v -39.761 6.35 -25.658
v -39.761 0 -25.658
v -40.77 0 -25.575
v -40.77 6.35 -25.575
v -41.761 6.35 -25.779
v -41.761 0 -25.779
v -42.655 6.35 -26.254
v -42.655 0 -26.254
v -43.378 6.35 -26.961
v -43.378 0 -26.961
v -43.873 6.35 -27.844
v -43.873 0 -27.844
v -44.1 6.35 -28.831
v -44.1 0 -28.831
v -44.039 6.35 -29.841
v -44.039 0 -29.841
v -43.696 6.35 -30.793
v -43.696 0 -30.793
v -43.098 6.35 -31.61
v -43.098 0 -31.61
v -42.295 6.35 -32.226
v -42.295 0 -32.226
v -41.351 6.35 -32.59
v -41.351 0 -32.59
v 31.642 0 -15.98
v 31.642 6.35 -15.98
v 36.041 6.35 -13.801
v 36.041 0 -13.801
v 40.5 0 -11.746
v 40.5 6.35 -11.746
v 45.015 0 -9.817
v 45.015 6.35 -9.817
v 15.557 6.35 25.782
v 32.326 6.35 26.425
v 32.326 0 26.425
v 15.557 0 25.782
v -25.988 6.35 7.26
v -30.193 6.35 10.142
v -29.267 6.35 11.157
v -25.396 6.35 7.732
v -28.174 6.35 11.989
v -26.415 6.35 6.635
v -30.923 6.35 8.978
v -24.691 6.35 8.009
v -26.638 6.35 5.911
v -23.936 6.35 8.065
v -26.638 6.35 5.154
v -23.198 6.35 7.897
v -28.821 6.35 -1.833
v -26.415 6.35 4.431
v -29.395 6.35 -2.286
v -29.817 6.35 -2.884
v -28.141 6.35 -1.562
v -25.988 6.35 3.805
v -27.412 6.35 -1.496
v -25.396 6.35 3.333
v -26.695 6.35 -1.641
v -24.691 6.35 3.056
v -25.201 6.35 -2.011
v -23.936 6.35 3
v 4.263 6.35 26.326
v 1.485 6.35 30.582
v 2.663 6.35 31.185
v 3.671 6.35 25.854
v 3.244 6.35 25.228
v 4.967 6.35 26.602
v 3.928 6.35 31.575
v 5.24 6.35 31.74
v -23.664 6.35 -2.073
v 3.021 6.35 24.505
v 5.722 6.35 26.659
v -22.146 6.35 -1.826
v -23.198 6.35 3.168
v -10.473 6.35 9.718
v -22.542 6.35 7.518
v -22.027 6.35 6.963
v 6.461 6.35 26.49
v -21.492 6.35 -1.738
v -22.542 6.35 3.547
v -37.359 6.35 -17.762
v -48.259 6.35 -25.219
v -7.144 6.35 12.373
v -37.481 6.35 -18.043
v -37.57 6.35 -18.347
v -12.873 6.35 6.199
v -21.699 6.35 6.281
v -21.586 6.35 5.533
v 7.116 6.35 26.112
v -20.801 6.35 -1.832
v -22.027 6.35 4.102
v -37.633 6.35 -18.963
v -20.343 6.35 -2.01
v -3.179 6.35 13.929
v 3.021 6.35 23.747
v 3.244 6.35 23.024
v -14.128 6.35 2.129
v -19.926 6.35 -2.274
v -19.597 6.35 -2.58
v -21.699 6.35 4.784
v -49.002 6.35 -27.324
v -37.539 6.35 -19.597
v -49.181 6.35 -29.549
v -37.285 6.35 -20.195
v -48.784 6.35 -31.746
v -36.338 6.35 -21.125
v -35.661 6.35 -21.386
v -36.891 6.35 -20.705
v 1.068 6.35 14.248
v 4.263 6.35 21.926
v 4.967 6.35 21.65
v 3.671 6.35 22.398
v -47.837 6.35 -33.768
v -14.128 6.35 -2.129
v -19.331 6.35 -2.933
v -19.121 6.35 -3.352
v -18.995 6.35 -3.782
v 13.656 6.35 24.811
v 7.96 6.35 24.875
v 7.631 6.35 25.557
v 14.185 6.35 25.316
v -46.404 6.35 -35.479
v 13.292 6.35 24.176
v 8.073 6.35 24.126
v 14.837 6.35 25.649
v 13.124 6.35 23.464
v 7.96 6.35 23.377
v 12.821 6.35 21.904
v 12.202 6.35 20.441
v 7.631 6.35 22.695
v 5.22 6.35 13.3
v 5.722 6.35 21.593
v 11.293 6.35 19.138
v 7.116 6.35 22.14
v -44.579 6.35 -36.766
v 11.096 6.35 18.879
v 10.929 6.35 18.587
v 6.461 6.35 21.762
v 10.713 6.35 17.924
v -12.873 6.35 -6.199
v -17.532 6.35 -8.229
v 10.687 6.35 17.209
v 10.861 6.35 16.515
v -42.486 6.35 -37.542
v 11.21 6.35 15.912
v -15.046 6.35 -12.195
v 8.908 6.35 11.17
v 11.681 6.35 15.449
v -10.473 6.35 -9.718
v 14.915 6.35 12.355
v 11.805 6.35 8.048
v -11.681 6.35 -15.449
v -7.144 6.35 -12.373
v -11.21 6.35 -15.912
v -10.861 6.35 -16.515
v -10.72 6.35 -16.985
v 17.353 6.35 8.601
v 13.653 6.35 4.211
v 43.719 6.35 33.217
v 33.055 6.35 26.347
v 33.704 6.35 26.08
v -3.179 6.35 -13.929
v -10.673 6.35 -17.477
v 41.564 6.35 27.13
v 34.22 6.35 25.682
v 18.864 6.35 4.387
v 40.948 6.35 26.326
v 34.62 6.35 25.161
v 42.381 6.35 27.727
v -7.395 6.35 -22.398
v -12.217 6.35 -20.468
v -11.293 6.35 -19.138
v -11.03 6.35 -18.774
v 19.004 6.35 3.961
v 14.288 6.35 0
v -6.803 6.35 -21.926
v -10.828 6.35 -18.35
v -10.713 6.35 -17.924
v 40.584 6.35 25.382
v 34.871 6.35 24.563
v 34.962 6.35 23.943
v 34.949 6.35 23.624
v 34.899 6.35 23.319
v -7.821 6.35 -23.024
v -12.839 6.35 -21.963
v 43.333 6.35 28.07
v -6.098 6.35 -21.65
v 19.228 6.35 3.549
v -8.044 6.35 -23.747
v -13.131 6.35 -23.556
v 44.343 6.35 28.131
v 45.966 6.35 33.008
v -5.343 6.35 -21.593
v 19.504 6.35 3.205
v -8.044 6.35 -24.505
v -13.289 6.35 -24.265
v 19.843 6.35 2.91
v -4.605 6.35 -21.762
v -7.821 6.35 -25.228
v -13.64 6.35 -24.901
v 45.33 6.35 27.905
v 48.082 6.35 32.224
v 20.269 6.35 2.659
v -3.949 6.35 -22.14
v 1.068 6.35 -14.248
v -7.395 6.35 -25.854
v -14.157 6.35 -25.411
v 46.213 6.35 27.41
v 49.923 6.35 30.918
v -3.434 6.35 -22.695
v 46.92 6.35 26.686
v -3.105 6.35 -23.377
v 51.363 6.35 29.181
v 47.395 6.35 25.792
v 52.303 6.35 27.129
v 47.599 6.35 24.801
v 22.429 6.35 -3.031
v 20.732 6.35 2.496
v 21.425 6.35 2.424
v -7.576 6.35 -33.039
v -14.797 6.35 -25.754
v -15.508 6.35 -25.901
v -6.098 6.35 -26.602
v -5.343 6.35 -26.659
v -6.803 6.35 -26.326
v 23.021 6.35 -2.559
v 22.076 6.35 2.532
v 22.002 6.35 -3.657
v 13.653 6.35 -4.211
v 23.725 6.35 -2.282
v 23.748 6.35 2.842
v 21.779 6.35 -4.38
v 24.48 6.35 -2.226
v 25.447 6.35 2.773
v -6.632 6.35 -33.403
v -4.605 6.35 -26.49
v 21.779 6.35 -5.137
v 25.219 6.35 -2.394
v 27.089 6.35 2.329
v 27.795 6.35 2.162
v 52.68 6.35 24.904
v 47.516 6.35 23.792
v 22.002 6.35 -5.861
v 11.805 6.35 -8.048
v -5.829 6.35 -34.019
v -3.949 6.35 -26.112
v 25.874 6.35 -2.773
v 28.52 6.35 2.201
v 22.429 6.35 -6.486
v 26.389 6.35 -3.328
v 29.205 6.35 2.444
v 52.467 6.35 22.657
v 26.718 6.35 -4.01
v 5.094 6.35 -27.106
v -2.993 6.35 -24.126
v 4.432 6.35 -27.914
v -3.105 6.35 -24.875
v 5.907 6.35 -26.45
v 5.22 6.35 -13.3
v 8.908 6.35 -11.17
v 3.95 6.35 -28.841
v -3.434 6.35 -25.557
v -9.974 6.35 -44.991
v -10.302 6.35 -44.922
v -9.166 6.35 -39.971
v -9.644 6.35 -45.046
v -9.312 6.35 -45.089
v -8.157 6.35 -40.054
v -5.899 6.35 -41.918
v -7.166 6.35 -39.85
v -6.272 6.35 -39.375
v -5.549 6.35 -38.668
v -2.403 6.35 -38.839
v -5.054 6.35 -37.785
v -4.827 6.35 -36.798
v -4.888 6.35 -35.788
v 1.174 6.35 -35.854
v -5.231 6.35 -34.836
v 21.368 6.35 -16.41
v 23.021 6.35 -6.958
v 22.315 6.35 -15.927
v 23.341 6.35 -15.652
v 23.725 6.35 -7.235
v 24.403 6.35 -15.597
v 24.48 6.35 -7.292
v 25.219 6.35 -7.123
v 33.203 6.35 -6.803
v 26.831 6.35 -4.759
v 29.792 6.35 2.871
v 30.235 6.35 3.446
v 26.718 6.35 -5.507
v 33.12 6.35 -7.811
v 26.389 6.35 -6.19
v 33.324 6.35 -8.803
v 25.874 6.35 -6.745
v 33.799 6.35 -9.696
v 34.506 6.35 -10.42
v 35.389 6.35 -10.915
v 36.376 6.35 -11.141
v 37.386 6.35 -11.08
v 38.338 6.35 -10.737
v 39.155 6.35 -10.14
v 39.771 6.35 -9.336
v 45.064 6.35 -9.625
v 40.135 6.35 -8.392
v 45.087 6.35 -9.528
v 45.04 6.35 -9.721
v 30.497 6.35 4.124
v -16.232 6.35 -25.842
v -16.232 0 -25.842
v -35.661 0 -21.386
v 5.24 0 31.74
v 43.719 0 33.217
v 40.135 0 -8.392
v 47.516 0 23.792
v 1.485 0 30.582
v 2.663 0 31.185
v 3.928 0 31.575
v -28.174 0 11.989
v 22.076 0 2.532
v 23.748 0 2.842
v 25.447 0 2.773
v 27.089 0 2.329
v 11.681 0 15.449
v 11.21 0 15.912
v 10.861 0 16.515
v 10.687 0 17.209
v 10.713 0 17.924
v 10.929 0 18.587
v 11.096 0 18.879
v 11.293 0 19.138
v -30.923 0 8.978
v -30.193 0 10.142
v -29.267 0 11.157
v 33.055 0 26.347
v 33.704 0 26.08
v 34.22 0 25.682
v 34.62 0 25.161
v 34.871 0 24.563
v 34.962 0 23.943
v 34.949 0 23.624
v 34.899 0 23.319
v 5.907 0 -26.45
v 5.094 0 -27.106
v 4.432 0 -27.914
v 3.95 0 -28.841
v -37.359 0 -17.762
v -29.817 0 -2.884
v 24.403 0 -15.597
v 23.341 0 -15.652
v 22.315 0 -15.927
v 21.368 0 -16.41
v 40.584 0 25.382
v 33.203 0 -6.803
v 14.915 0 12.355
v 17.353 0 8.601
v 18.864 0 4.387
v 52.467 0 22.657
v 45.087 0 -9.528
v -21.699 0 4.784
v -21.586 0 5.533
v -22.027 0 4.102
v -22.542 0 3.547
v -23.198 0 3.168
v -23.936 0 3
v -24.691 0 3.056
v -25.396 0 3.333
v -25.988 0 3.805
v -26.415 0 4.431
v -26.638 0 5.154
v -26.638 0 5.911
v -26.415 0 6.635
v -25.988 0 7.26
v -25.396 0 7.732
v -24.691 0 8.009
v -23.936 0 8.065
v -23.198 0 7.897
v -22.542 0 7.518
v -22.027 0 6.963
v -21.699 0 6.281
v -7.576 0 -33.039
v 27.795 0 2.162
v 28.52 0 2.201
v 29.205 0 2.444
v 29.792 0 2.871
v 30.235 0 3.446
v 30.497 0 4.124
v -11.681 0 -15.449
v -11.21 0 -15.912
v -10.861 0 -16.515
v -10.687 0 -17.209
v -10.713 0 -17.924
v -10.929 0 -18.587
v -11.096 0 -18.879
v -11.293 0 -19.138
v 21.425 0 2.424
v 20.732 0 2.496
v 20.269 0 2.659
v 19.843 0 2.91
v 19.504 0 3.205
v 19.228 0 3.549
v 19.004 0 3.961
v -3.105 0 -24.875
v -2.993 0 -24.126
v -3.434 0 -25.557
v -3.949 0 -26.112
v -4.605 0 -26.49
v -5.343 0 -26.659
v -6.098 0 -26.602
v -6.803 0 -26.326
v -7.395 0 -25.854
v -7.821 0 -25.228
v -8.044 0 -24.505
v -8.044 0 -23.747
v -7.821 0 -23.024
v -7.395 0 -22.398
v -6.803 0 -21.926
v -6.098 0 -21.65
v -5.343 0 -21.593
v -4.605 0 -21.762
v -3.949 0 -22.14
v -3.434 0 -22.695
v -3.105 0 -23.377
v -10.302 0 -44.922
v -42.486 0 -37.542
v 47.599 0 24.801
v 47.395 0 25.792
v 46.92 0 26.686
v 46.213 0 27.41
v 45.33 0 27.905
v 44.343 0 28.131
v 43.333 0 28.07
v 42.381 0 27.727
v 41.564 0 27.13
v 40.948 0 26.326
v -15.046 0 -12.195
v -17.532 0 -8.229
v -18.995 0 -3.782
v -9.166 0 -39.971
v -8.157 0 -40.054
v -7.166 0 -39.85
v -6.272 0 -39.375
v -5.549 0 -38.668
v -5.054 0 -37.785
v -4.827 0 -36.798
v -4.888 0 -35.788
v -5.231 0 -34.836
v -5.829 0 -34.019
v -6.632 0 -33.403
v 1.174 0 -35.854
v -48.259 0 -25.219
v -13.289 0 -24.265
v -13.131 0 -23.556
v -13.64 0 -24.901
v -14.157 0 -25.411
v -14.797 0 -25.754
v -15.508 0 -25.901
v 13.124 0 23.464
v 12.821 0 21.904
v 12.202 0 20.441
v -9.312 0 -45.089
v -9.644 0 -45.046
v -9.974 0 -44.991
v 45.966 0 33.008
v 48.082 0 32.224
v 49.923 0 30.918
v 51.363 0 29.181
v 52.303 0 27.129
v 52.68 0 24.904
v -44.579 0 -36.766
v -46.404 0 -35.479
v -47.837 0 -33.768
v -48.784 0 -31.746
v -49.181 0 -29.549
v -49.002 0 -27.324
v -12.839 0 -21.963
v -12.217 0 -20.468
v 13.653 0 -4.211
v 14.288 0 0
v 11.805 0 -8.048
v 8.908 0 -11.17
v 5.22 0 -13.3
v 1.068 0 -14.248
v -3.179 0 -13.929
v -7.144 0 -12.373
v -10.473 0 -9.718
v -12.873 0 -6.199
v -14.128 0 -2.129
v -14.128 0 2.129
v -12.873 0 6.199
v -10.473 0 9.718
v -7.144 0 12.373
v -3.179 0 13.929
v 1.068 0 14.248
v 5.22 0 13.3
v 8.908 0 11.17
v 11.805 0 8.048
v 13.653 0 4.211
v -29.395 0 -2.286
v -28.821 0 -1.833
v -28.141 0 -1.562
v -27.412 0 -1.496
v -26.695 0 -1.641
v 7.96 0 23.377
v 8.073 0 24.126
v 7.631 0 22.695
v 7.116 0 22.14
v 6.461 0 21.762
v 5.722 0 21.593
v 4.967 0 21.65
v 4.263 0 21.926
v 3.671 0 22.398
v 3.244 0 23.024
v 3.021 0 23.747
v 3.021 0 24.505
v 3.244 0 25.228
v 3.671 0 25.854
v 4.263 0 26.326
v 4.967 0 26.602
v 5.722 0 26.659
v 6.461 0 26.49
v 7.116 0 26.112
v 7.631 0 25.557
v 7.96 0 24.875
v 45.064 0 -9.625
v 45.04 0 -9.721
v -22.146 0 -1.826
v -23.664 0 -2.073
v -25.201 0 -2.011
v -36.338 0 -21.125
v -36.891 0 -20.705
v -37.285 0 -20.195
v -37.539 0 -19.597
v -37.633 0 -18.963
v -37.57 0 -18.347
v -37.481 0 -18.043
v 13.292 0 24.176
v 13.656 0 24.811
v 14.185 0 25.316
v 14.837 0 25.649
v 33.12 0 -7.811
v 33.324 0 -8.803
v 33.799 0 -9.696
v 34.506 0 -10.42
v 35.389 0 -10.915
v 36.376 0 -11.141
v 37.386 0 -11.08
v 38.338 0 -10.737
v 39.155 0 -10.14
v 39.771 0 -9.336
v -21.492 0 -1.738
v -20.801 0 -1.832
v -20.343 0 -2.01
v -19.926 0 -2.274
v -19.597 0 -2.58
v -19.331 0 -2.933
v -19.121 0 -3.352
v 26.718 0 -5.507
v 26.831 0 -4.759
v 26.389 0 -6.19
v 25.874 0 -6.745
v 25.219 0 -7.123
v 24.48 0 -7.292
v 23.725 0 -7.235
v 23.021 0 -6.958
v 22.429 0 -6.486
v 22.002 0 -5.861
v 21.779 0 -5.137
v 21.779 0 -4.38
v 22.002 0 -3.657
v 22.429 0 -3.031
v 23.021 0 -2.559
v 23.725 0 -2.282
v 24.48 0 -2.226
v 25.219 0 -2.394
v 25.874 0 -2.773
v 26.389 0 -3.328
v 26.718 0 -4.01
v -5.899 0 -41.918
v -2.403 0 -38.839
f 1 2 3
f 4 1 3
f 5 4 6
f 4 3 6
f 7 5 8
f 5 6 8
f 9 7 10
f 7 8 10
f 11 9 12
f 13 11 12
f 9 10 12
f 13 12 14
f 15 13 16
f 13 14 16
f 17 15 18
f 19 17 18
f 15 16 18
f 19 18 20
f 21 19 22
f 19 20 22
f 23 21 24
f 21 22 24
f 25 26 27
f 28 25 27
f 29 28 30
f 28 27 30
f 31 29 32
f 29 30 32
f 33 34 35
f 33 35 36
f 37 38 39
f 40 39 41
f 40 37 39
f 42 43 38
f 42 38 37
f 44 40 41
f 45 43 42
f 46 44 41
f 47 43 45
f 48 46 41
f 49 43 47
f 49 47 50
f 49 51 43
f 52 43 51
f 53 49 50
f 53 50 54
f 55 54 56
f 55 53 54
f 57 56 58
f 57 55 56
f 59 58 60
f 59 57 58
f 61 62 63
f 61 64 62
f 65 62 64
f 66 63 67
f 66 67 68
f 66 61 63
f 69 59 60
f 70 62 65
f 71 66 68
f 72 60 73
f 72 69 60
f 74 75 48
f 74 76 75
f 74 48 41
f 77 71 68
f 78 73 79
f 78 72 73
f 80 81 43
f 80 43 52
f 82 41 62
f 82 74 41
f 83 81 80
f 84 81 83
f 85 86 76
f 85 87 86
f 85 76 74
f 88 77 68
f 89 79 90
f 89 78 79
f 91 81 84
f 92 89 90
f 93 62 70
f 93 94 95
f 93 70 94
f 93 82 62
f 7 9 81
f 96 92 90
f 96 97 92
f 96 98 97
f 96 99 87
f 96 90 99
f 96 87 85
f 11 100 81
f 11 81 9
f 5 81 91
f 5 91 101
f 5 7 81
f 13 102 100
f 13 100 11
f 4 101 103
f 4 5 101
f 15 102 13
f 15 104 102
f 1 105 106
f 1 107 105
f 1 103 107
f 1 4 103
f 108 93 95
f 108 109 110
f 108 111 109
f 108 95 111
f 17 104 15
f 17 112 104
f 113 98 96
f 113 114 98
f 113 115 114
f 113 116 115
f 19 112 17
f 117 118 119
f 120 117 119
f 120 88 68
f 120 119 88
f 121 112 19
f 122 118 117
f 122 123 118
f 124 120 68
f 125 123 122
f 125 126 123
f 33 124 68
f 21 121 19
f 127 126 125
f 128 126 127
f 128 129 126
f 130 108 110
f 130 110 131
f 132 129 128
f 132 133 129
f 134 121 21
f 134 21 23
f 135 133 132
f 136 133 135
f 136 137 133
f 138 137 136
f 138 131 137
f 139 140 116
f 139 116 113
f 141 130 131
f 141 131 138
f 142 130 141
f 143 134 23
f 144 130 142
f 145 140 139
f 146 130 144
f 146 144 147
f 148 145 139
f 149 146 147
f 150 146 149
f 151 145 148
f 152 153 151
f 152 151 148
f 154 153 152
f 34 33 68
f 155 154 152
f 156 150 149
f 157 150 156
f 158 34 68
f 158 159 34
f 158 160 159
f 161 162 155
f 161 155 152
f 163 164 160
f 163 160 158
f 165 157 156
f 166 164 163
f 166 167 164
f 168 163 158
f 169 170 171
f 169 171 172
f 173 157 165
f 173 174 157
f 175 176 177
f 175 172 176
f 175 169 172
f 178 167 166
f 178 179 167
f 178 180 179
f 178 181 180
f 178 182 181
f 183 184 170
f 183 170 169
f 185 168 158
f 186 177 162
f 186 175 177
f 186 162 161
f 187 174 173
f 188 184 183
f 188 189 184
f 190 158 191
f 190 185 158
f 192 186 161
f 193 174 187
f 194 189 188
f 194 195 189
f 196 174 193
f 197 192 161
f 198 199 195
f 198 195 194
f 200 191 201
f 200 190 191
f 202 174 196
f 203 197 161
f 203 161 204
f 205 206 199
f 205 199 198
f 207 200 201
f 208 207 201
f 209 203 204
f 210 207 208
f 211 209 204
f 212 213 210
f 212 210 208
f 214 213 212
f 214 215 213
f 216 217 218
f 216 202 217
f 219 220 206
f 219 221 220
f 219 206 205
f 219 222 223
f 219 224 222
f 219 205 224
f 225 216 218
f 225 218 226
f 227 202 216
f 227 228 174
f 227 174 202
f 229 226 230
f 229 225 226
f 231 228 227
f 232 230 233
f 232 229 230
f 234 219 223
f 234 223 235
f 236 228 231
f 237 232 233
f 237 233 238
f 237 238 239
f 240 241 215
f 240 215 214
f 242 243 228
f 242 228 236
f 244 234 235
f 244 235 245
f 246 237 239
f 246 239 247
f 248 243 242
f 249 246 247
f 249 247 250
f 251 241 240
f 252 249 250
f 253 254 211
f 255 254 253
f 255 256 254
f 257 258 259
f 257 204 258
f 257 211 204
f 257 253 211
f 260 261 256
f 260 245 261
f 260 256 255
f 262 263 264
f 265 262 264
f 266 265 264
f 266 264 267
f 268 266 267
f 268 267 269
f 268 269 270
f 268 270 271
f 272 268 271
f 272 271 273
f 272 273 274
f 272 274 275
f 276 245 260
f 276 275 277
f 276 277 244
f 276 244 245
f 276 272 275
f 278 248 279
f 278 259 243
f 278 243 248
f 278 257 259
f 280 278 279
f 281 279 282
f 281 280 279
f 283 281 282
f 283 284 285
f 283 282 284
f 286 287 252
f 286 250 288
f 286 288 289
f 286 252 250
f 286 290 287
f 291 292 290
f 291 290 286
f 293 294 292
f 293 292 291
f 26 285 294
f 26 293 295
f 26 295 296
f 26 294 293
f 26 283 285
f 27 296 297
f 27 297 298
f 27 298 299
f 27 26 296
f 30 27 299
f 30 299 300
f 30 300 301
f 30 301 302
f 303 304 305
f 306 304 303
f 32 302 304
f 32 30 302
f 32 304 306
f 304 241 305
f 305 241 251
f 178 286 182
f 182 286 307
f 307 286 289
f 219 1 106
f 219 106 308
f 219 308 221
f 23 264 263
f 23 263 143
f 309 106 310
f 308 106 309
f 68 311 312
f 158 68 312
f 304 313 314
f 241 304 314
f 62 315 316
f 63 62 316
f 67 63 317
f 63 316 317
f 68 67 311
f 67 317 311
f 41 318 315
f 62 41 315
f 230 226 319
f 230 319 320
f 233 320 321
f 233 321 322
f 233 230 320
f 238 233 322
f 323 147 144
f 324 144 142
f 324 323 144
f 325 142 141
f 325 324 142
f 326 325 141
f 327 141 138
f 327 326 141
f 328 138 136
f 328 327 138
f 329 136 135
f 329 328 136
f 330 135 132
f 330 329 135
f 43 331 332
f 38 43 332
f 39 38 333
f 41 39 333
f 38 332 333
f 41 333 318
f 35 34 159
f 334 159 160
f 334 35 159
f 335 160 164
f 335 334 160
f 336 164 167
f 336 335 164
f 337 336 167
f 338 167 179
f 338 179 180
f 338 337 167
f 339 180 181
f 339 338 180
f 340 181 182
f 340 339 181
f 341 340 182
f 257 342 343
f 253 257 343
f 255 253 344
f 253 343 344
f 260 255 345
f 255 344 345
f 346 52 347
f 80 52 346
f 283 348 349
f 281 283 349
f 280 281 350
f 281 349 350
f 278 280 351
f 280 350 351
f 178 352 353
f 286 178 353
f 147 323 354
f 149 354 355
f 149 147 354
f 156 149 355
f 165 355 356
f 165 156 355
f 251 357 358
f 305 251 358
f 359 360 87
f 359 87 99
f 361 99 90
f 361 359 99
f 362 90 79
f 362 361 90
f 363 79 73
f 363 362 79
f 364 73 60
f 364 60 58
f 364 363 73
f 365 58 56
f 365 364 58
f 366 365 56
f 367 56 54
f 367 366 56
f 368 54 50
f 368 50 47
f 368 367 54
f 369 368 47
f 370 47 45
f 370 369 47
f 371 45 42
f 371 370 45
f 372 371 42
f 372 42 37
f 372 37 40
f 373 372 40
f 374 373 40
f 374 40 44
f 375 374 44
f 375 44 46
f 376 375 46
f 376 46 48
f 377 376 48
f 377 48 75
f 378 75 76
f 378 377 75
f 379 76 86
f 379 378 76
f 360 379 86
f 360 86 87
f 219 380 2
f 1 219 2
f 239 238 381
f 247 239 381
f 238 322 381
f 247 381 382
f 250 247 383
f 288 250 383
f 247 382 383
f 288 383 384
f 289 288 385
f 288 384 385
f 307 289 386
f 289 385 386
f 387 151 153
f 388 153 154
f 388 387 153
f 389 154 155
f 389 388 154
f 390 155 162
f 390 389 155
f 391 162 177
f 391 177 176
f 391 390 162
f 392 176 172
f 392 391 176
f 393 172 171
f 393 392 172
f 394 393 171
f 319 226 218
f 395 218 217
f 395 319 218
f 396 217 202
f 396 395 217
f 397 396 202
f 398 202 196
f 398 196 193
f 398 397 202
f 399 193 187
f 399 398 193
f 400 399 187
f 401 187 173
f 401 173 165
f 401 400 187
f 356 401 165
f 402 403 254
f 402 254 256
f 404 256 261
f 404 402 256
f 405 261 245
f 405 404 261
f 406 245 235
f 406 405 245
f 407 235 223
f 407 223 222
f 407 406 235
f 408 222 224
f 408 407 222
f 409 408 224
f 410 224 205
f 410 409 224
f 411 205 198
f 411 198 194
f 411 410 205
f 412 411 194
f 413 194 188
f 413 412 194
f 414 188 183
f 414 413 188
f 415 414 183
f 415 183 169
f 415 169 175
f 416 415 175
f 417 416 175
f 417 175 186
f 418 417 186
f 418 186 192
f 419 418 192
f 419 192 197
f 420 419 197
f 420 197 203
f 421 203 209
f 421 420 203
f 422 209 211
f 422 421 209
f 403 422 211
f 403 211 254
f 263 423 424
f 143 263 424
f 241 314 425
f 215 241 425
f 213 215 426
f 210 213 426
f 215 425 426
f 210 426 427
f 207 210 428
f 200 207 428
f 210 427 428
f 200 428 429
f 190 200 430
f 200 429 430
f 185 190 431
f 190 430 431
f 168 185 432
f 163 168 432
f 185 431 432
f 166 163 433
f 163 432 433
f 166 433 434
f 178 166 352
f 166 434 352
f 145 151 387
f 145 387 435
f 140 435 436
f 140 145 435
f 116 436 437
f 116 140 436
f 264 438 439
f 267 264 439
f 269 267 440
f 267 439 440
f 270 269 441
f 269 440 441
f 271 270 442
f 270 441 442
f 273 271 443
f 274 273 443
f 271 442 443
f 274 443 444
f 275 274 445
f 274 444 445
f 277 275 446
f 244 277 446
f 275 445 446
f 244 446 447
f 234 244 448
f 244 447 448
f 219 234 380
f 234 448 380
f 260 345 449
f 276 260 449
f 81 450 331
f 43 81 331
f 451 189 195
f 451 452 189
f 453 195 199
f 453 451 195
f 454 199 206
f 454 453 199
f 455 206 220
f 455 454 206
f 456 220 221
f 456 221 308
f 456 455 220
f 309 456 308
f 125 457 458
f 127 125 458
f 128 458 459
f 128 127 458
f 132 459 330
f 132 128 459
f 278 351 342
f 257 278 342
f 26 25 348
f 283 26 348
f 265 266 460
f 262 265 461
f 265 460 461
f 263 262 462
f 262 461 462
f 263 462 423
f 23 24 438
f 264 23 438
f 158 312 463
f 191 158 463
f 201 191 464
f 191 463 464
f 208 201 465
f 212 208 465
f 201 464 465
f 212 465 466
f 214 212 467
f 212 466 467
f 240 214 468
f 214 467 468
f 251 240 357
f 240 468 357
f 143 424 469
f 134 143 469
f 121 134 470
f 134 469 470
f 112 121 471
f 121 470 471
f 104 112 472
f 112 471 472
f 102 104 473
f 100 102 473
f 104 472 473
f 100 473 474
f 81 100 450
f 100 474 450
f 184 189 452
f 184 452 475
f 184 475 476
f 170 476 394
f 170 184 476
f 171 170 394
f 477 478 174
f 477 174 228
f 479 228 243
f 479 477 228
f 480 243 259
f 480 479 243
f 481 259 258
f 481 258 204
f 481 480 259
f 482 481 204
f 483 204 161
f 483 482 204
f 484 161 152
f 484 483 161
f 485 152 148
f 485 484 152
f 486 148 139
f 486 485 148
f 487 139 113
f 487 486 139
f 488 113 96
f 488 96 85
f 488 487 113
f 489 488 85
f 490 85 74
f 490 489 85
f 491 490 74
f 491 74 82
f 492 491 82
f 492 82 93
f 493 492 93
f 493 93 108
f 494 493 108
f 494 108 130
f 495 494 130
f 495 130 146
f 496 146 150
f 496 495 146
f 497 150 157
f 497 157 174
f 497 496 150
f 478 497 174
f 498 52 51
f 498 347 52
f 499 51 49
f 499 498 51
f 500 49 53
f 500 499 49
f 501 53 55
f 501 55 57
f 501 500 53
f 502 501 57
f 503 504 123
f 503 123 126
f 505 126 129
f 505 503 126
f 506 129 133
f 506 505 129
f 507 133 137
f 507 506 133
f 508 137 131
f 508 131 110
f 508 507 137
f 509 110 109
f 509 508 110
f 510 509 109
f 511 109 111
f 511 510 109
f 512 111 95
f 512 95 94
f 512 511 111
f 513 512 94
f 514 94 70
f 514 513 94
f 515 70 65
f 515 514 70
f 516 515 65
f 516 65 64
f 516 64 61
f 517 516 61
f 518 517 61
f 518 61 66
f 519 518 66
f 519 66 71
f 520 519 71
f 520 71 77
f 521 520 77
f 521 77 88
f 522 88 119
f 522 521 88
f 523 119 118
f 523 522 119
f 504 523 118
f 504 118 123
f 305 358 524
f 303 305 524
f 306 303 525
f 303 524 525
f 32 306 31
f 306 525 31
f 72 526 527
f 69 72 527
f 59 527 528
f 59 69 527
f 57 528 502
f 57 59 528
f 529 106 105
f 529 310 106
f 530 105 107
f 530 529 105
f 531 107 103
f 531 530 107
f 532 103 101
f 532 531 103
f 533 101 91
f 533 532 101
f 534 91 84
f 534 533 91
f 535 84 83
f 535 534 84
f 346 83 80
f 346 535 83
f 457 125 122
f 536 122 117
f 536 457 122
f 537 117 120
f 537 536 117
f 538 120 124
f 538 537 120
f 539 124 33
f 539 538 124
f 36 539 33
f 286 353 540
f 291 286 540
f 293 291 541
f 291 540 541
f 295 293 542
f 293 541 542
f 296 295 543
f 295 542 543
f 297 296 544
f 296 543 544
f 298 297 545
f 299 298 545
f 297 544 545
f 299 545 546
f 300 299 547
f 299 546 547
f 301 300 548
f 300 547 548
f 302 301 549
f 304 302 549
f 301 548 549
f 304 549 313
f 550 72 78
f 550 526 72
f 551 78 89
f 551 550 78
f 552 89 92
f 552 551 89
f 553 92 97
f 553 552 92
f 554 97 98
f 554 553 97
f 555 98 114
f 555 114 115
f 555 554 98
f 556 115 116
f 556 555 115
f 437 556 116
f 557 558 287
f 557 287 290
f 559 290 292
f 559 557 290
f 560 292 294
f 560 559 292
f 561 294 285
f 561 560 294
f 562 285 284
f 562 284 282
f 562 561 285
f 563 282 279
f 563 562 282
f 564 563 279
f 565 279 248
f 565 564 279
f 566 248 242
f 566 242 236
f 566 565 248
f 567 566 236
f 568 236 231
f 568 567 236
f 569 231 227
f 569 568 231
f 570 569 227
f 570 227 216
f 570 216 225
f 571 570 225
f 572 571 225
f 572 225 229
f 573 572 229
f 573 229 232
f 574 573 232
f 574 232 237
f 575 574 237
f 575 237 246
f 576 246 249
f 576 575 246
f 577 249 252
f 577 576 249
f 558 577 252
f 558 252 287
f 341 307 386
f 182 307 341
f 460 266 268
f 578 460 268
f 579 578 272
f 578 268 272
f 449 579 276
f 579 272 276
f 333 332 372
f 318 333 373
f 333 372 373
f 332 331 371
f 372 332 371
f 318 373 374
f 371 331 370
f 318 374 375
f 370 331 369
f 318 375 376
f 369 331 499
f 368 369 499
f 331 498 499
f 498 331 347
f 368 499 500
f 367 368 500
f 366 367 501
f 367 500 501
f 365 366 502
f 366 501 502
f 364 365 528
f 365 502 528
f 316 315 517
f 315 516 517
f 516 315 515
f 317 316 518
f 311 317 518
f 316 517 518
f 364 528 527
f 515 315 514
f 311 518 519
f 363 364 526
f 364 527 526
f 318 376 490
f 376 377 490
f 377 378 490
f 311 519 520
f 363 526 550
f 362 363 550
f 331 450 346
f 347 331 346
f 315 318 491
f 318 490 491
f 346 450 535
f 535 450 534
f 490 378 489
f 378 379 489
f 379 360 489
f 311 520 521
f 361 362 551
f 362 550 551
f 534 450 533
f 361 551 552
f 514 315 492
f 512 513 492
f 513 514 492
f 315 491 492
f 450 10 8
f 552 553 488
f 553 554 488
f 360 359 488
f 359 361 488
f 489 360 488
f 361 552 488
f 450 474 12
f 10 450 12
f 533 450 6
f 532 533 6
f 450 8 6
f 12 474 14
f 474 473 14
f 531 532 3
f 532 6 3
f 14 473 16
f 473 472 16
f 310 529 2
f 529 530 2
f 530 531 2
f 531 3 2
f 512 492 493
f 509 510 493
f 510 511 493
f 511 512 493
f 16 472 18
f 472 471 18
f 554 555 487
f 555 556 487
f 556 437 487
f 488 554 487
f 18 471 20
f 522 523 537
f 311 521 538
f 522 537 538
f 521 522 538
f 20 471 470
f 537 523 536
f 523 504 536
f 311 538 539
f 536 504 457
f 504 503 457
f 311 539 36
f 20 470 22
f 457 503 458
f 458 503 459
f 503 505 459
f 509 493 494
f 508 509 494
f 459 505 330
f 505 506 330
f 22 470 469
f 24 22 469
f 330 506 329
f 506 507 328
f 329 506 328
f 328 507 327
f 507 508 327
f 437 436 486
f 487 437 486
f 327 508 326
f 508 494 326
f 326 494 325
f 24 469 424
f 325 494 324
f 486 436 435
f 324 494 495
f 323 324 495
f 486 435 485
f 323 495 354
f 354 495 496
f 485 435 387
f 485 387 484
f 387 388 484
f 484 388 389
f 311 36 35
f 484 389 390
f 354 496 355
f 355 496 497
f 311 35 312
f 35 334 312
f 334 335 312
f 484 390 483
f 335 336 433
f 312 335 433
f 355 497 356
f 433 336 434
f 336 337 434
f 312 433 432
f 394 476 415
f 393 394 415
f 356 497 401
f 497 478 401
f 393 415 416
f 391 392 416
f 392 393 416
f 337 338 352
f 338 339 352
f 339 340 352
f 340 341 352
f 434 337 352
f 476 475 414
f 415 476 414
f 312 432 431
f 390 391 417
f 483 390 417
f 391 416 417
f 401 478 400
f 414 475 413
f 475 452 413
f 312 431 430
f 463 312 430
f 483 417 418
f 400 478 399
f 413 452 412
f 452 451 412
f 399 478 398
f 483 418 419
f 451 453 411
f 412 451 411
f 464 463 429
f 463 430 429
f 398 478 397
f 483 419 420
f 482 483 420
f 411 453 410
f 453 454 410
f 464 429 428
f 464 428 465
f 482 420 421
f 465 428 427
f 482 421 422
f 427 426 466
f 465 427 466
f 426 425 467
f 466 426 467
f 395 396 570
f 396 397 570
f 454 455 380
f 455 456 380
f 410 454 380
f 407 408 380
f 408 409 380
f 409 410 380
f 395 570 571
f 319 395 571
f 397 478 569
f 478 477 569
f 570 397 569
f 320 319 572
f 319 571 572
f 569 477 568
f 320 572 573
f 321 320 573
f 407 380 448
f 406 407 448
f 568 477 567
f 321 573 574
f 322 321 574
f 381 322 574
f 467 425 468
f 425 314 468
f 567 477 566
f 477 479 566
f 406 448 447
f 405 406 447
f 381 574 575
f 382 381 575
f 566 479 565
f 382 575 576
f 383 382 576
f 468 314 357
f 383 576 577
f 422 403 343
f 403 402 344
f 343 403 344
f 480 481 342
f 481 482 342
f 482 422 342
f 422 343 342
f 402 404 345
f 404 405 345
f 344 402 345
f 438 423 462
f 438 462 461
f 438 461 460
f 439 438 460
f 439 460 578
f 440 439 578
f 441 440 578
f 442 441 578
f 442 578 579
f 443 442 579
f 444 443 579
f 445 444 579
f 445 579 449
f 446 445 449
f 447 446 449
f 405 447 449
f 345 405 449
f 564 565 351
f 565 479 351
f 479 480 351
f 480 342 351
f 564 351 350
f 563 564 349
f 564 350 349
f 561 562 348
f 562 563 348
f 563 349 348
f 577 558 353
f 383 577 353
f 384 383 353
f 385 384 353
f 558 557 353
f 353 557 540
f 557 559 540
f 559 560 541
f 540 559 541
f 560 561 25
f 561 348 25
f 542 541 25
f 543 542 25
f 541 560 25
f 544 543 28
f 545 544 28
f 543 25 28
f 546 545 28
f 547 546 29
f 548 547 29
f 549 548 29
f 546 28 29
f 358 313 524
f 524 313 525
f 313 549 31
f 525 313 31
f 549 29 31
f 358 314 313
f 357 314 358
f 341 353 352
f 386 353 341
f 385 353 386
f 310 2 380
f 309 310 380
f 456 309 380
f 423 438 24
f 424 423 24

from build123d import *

# Parameters (mm, degrees)
SKETCH1_R           = 2.54
SKETCH1_R_2         = 14.2875
BOSS_EXTRUDE1_DEPTH = 6.35
SKETCH3_R           = 175
CUT_EXTRUDE1_DEPTH  = 7.35
FILLET1_R           = 2.54


with BuildPart() as part:
    # Sketch1 → Boss-Extrude1 (new body)
    with BuildSketch(Plane(origin=(0, 0, 0), x_dir=(1, 0, 0), z_dir=(0, 1, 0))):
        with BuildLine():
            Line((-10.301536111, 44.922263418), (-42.486128255, 37.541719497))
            ThreePointArc((-42.486128255, 37.541719497), (-48.376257791, 32.787738977), (-48.258608454, 25.219376184))
            Line((-48.258608454, 25.219376184), (-30.922632743, -8.978011563))
            ThreePointArc((-30.922632743, -8.978011563), (-29.753188396, -10.670651305), (-28.173552503, -11.988748349))
            Line((-28.173552503, -11.988748349), (1.485082186, -30.582244497))
            ThreePointArc((1.485082186, -30.582244497), (3.286793362, -31.407609936), (5.240405543, -31.740462332))
            Line((5.240405543, -31.740462332), (43.718670442, -33.216869907))
            ThreePointArc((43.718670442, -33.216869907), (50.700017874, -30.096753296), (52.467298047, -22.656923969))
            Line((52.467298047, -22.656923969), (45.086754126, 9.527668174))
            ThreePointArc((45.086754126, 9.527668174), (41.870070274, 14.491711544), (36.213465331, 16.221336388))
            Line((36.213465331, 16.221336388), (24.402688291, 15.597131936))
            ThreePointArc((24.402688291, 15.597131936), (22.820864626, 15.76285886), (21.367816063, 16.409605637))
            Line((21.367816063, 16.409605637), (5.906875614, 26.450057762))
            ThreePointArc((5.906875614, 26.450057762), (4.742385284, 27.493110687), (3.950204921, 28.84086712))
            Line((3.950204921, 28.84086712), (-0.341397124, 39.683137821))
            ThreePointArc((-0.341397124, 39.683137821), (-4.350888408, 44.147873767), (-10.301536111, 44.922263418))
        make_face()
        with Locations((-5.53256927, 24.126065418)):
            Circle(SKETCH1_R, mode=Mode.SUBTRACT)
        with Locations((24.290556126, 4.758701333)):
            Circle(SKETCH1_R, mode=Mode.SUBTRACT)
        with Locations((5.53256927, -24.126065418)):
            Circle(SKETCH1_R, mode=Mode.SUBTRACT)
        with Locations((-24.126065418, -5.53256927)):
            Circle(SKETCH1_R, mode=Mode.SUBTRACT)
        Circle(SKETCH1_R_2, mode=Mode.SUBTRACT)
        with BuildLine():
            Line((40.135278412, 8.392199879), (47.515822333, -23.792392264))
            ThreePointArc((47.515822333, -23.792392264), (44.84461714, -28.053253071), (40.583756333, -25.382047878))
            Line((40.583756333, -25.382047878), (33.203212412, 6.802544265))
            ThreePointArc((33.203212412, 6.802544265), (35.874417605, 11.063405072), (40.135278412, 8.392199879))
        make_face(mode=Mode.SUBTRACT)
        with BuildLine():
            Line((-7.576412202, 33.038721704), (-39.761004345, 25.658177783))
            ThreePointArc((-39.761004345, 25.658177783), (-44.021865152, 28.329382976), (-41.350659959, 32.590243783))
            Line((-41.350659959, 32.590243783), (-9.166067816, 39.970787704))
            ThreePointArc((-9.166067816, 39.970787704), (-4.905207009, 37.299582511), (-7.576412202, 33.038721704))
        make_face(mode=Mode.SUBTRACT)
    extrude(amount=BOSS_EXTRUDE1_DEPTH)

    # Sketch3 → Cut-Extrude1 (cut, through all)
    with BuildSketch(Plane(origin=(0, 6.35, 0), x_dir=(1, 0, 0), z_dir=(0, 1, 0))):
        with Locations((111.500681804, 171.695993352)):
            Circle(SKETCH3_R)
        with BuildLine():
            Line((29.692484449, -0.615642385), (35.632280619, -26.517516174))
            ThreePointArc((35.632280619, -26.517516174), (35.636280873, -26.534877998), (35.640316938, -26.552231532))
            Line((35.640316938, -26.552231532), (12.991771922, -25.68320889))
            ThreePointArc((12.991771922, -25.68320889), (12.360044144, -20.742282498), (8.810828705, -17.247299898))
            ThreePointArc((8.810828705, -17.247299898), (16.242952225, -10.548296511), (19.339879369, -1.033983679))
            ThreePointArc((19.339879369, -1.033983679), (24.598223728, -2.85508489), (29.692484449, -0.615642385))
        make_face()
        with BuildLine():
            Line((-38.62553605, 20.706702069), (-12.723662261, 26.646498238))
            ThreePointArc((-12.723662261, 26.646498238), (-12.567344847, 21.197527799), (-8.810828705, 17.247299898))
            ThreePointArc((-8.810828705, 17.247299898), (-16.40945516, 10.287363006), (-19.363045216, 0.415374791))
            ThreePointArc((-19.363045216, 0.415374791), (-23.979054852, 2.086012481), (-28.656078555, 0.594696105))
            Line((-28.656078555, 0.594696105), (-38.829256345, 20.662566027))
            ThreePointArc((-38.829256345, 20.662566027), (-38.727263029, 20.684019377), (-38.62553605, 20.706702069))
        make_face()
    extrude(amount=-CUT_EXTRUDE1_DEPTH, mode=Mode.SUBTRACT)

    # Fillet1
    fillet1_edges = [part.edges().sort_by_distance(p)[0] for p in [
        (35.640316938, 3.175, 26.552231532),
        (8.810828705, 3.175, 17.247299898),
        (12.991771922, 3.175, 25.68320889),
        (29.692484449, 3.175, 0.615642385),
        (19.339879369, 3.175, 1.033983679),
        (-38.829256345, 3.175, -20.662566027),
        (-28.656078555, 3.175, -0.594696105),
        (-19.363045216, 3.175, -0.415374791),
        (-8.810828705, 3.175, -17.247299898),
        (-12.723662261, 3.175, -26.646498238),
    ]]
    fillet(fillet1_edges, radius=FILLET1_R)


solid = part.part
